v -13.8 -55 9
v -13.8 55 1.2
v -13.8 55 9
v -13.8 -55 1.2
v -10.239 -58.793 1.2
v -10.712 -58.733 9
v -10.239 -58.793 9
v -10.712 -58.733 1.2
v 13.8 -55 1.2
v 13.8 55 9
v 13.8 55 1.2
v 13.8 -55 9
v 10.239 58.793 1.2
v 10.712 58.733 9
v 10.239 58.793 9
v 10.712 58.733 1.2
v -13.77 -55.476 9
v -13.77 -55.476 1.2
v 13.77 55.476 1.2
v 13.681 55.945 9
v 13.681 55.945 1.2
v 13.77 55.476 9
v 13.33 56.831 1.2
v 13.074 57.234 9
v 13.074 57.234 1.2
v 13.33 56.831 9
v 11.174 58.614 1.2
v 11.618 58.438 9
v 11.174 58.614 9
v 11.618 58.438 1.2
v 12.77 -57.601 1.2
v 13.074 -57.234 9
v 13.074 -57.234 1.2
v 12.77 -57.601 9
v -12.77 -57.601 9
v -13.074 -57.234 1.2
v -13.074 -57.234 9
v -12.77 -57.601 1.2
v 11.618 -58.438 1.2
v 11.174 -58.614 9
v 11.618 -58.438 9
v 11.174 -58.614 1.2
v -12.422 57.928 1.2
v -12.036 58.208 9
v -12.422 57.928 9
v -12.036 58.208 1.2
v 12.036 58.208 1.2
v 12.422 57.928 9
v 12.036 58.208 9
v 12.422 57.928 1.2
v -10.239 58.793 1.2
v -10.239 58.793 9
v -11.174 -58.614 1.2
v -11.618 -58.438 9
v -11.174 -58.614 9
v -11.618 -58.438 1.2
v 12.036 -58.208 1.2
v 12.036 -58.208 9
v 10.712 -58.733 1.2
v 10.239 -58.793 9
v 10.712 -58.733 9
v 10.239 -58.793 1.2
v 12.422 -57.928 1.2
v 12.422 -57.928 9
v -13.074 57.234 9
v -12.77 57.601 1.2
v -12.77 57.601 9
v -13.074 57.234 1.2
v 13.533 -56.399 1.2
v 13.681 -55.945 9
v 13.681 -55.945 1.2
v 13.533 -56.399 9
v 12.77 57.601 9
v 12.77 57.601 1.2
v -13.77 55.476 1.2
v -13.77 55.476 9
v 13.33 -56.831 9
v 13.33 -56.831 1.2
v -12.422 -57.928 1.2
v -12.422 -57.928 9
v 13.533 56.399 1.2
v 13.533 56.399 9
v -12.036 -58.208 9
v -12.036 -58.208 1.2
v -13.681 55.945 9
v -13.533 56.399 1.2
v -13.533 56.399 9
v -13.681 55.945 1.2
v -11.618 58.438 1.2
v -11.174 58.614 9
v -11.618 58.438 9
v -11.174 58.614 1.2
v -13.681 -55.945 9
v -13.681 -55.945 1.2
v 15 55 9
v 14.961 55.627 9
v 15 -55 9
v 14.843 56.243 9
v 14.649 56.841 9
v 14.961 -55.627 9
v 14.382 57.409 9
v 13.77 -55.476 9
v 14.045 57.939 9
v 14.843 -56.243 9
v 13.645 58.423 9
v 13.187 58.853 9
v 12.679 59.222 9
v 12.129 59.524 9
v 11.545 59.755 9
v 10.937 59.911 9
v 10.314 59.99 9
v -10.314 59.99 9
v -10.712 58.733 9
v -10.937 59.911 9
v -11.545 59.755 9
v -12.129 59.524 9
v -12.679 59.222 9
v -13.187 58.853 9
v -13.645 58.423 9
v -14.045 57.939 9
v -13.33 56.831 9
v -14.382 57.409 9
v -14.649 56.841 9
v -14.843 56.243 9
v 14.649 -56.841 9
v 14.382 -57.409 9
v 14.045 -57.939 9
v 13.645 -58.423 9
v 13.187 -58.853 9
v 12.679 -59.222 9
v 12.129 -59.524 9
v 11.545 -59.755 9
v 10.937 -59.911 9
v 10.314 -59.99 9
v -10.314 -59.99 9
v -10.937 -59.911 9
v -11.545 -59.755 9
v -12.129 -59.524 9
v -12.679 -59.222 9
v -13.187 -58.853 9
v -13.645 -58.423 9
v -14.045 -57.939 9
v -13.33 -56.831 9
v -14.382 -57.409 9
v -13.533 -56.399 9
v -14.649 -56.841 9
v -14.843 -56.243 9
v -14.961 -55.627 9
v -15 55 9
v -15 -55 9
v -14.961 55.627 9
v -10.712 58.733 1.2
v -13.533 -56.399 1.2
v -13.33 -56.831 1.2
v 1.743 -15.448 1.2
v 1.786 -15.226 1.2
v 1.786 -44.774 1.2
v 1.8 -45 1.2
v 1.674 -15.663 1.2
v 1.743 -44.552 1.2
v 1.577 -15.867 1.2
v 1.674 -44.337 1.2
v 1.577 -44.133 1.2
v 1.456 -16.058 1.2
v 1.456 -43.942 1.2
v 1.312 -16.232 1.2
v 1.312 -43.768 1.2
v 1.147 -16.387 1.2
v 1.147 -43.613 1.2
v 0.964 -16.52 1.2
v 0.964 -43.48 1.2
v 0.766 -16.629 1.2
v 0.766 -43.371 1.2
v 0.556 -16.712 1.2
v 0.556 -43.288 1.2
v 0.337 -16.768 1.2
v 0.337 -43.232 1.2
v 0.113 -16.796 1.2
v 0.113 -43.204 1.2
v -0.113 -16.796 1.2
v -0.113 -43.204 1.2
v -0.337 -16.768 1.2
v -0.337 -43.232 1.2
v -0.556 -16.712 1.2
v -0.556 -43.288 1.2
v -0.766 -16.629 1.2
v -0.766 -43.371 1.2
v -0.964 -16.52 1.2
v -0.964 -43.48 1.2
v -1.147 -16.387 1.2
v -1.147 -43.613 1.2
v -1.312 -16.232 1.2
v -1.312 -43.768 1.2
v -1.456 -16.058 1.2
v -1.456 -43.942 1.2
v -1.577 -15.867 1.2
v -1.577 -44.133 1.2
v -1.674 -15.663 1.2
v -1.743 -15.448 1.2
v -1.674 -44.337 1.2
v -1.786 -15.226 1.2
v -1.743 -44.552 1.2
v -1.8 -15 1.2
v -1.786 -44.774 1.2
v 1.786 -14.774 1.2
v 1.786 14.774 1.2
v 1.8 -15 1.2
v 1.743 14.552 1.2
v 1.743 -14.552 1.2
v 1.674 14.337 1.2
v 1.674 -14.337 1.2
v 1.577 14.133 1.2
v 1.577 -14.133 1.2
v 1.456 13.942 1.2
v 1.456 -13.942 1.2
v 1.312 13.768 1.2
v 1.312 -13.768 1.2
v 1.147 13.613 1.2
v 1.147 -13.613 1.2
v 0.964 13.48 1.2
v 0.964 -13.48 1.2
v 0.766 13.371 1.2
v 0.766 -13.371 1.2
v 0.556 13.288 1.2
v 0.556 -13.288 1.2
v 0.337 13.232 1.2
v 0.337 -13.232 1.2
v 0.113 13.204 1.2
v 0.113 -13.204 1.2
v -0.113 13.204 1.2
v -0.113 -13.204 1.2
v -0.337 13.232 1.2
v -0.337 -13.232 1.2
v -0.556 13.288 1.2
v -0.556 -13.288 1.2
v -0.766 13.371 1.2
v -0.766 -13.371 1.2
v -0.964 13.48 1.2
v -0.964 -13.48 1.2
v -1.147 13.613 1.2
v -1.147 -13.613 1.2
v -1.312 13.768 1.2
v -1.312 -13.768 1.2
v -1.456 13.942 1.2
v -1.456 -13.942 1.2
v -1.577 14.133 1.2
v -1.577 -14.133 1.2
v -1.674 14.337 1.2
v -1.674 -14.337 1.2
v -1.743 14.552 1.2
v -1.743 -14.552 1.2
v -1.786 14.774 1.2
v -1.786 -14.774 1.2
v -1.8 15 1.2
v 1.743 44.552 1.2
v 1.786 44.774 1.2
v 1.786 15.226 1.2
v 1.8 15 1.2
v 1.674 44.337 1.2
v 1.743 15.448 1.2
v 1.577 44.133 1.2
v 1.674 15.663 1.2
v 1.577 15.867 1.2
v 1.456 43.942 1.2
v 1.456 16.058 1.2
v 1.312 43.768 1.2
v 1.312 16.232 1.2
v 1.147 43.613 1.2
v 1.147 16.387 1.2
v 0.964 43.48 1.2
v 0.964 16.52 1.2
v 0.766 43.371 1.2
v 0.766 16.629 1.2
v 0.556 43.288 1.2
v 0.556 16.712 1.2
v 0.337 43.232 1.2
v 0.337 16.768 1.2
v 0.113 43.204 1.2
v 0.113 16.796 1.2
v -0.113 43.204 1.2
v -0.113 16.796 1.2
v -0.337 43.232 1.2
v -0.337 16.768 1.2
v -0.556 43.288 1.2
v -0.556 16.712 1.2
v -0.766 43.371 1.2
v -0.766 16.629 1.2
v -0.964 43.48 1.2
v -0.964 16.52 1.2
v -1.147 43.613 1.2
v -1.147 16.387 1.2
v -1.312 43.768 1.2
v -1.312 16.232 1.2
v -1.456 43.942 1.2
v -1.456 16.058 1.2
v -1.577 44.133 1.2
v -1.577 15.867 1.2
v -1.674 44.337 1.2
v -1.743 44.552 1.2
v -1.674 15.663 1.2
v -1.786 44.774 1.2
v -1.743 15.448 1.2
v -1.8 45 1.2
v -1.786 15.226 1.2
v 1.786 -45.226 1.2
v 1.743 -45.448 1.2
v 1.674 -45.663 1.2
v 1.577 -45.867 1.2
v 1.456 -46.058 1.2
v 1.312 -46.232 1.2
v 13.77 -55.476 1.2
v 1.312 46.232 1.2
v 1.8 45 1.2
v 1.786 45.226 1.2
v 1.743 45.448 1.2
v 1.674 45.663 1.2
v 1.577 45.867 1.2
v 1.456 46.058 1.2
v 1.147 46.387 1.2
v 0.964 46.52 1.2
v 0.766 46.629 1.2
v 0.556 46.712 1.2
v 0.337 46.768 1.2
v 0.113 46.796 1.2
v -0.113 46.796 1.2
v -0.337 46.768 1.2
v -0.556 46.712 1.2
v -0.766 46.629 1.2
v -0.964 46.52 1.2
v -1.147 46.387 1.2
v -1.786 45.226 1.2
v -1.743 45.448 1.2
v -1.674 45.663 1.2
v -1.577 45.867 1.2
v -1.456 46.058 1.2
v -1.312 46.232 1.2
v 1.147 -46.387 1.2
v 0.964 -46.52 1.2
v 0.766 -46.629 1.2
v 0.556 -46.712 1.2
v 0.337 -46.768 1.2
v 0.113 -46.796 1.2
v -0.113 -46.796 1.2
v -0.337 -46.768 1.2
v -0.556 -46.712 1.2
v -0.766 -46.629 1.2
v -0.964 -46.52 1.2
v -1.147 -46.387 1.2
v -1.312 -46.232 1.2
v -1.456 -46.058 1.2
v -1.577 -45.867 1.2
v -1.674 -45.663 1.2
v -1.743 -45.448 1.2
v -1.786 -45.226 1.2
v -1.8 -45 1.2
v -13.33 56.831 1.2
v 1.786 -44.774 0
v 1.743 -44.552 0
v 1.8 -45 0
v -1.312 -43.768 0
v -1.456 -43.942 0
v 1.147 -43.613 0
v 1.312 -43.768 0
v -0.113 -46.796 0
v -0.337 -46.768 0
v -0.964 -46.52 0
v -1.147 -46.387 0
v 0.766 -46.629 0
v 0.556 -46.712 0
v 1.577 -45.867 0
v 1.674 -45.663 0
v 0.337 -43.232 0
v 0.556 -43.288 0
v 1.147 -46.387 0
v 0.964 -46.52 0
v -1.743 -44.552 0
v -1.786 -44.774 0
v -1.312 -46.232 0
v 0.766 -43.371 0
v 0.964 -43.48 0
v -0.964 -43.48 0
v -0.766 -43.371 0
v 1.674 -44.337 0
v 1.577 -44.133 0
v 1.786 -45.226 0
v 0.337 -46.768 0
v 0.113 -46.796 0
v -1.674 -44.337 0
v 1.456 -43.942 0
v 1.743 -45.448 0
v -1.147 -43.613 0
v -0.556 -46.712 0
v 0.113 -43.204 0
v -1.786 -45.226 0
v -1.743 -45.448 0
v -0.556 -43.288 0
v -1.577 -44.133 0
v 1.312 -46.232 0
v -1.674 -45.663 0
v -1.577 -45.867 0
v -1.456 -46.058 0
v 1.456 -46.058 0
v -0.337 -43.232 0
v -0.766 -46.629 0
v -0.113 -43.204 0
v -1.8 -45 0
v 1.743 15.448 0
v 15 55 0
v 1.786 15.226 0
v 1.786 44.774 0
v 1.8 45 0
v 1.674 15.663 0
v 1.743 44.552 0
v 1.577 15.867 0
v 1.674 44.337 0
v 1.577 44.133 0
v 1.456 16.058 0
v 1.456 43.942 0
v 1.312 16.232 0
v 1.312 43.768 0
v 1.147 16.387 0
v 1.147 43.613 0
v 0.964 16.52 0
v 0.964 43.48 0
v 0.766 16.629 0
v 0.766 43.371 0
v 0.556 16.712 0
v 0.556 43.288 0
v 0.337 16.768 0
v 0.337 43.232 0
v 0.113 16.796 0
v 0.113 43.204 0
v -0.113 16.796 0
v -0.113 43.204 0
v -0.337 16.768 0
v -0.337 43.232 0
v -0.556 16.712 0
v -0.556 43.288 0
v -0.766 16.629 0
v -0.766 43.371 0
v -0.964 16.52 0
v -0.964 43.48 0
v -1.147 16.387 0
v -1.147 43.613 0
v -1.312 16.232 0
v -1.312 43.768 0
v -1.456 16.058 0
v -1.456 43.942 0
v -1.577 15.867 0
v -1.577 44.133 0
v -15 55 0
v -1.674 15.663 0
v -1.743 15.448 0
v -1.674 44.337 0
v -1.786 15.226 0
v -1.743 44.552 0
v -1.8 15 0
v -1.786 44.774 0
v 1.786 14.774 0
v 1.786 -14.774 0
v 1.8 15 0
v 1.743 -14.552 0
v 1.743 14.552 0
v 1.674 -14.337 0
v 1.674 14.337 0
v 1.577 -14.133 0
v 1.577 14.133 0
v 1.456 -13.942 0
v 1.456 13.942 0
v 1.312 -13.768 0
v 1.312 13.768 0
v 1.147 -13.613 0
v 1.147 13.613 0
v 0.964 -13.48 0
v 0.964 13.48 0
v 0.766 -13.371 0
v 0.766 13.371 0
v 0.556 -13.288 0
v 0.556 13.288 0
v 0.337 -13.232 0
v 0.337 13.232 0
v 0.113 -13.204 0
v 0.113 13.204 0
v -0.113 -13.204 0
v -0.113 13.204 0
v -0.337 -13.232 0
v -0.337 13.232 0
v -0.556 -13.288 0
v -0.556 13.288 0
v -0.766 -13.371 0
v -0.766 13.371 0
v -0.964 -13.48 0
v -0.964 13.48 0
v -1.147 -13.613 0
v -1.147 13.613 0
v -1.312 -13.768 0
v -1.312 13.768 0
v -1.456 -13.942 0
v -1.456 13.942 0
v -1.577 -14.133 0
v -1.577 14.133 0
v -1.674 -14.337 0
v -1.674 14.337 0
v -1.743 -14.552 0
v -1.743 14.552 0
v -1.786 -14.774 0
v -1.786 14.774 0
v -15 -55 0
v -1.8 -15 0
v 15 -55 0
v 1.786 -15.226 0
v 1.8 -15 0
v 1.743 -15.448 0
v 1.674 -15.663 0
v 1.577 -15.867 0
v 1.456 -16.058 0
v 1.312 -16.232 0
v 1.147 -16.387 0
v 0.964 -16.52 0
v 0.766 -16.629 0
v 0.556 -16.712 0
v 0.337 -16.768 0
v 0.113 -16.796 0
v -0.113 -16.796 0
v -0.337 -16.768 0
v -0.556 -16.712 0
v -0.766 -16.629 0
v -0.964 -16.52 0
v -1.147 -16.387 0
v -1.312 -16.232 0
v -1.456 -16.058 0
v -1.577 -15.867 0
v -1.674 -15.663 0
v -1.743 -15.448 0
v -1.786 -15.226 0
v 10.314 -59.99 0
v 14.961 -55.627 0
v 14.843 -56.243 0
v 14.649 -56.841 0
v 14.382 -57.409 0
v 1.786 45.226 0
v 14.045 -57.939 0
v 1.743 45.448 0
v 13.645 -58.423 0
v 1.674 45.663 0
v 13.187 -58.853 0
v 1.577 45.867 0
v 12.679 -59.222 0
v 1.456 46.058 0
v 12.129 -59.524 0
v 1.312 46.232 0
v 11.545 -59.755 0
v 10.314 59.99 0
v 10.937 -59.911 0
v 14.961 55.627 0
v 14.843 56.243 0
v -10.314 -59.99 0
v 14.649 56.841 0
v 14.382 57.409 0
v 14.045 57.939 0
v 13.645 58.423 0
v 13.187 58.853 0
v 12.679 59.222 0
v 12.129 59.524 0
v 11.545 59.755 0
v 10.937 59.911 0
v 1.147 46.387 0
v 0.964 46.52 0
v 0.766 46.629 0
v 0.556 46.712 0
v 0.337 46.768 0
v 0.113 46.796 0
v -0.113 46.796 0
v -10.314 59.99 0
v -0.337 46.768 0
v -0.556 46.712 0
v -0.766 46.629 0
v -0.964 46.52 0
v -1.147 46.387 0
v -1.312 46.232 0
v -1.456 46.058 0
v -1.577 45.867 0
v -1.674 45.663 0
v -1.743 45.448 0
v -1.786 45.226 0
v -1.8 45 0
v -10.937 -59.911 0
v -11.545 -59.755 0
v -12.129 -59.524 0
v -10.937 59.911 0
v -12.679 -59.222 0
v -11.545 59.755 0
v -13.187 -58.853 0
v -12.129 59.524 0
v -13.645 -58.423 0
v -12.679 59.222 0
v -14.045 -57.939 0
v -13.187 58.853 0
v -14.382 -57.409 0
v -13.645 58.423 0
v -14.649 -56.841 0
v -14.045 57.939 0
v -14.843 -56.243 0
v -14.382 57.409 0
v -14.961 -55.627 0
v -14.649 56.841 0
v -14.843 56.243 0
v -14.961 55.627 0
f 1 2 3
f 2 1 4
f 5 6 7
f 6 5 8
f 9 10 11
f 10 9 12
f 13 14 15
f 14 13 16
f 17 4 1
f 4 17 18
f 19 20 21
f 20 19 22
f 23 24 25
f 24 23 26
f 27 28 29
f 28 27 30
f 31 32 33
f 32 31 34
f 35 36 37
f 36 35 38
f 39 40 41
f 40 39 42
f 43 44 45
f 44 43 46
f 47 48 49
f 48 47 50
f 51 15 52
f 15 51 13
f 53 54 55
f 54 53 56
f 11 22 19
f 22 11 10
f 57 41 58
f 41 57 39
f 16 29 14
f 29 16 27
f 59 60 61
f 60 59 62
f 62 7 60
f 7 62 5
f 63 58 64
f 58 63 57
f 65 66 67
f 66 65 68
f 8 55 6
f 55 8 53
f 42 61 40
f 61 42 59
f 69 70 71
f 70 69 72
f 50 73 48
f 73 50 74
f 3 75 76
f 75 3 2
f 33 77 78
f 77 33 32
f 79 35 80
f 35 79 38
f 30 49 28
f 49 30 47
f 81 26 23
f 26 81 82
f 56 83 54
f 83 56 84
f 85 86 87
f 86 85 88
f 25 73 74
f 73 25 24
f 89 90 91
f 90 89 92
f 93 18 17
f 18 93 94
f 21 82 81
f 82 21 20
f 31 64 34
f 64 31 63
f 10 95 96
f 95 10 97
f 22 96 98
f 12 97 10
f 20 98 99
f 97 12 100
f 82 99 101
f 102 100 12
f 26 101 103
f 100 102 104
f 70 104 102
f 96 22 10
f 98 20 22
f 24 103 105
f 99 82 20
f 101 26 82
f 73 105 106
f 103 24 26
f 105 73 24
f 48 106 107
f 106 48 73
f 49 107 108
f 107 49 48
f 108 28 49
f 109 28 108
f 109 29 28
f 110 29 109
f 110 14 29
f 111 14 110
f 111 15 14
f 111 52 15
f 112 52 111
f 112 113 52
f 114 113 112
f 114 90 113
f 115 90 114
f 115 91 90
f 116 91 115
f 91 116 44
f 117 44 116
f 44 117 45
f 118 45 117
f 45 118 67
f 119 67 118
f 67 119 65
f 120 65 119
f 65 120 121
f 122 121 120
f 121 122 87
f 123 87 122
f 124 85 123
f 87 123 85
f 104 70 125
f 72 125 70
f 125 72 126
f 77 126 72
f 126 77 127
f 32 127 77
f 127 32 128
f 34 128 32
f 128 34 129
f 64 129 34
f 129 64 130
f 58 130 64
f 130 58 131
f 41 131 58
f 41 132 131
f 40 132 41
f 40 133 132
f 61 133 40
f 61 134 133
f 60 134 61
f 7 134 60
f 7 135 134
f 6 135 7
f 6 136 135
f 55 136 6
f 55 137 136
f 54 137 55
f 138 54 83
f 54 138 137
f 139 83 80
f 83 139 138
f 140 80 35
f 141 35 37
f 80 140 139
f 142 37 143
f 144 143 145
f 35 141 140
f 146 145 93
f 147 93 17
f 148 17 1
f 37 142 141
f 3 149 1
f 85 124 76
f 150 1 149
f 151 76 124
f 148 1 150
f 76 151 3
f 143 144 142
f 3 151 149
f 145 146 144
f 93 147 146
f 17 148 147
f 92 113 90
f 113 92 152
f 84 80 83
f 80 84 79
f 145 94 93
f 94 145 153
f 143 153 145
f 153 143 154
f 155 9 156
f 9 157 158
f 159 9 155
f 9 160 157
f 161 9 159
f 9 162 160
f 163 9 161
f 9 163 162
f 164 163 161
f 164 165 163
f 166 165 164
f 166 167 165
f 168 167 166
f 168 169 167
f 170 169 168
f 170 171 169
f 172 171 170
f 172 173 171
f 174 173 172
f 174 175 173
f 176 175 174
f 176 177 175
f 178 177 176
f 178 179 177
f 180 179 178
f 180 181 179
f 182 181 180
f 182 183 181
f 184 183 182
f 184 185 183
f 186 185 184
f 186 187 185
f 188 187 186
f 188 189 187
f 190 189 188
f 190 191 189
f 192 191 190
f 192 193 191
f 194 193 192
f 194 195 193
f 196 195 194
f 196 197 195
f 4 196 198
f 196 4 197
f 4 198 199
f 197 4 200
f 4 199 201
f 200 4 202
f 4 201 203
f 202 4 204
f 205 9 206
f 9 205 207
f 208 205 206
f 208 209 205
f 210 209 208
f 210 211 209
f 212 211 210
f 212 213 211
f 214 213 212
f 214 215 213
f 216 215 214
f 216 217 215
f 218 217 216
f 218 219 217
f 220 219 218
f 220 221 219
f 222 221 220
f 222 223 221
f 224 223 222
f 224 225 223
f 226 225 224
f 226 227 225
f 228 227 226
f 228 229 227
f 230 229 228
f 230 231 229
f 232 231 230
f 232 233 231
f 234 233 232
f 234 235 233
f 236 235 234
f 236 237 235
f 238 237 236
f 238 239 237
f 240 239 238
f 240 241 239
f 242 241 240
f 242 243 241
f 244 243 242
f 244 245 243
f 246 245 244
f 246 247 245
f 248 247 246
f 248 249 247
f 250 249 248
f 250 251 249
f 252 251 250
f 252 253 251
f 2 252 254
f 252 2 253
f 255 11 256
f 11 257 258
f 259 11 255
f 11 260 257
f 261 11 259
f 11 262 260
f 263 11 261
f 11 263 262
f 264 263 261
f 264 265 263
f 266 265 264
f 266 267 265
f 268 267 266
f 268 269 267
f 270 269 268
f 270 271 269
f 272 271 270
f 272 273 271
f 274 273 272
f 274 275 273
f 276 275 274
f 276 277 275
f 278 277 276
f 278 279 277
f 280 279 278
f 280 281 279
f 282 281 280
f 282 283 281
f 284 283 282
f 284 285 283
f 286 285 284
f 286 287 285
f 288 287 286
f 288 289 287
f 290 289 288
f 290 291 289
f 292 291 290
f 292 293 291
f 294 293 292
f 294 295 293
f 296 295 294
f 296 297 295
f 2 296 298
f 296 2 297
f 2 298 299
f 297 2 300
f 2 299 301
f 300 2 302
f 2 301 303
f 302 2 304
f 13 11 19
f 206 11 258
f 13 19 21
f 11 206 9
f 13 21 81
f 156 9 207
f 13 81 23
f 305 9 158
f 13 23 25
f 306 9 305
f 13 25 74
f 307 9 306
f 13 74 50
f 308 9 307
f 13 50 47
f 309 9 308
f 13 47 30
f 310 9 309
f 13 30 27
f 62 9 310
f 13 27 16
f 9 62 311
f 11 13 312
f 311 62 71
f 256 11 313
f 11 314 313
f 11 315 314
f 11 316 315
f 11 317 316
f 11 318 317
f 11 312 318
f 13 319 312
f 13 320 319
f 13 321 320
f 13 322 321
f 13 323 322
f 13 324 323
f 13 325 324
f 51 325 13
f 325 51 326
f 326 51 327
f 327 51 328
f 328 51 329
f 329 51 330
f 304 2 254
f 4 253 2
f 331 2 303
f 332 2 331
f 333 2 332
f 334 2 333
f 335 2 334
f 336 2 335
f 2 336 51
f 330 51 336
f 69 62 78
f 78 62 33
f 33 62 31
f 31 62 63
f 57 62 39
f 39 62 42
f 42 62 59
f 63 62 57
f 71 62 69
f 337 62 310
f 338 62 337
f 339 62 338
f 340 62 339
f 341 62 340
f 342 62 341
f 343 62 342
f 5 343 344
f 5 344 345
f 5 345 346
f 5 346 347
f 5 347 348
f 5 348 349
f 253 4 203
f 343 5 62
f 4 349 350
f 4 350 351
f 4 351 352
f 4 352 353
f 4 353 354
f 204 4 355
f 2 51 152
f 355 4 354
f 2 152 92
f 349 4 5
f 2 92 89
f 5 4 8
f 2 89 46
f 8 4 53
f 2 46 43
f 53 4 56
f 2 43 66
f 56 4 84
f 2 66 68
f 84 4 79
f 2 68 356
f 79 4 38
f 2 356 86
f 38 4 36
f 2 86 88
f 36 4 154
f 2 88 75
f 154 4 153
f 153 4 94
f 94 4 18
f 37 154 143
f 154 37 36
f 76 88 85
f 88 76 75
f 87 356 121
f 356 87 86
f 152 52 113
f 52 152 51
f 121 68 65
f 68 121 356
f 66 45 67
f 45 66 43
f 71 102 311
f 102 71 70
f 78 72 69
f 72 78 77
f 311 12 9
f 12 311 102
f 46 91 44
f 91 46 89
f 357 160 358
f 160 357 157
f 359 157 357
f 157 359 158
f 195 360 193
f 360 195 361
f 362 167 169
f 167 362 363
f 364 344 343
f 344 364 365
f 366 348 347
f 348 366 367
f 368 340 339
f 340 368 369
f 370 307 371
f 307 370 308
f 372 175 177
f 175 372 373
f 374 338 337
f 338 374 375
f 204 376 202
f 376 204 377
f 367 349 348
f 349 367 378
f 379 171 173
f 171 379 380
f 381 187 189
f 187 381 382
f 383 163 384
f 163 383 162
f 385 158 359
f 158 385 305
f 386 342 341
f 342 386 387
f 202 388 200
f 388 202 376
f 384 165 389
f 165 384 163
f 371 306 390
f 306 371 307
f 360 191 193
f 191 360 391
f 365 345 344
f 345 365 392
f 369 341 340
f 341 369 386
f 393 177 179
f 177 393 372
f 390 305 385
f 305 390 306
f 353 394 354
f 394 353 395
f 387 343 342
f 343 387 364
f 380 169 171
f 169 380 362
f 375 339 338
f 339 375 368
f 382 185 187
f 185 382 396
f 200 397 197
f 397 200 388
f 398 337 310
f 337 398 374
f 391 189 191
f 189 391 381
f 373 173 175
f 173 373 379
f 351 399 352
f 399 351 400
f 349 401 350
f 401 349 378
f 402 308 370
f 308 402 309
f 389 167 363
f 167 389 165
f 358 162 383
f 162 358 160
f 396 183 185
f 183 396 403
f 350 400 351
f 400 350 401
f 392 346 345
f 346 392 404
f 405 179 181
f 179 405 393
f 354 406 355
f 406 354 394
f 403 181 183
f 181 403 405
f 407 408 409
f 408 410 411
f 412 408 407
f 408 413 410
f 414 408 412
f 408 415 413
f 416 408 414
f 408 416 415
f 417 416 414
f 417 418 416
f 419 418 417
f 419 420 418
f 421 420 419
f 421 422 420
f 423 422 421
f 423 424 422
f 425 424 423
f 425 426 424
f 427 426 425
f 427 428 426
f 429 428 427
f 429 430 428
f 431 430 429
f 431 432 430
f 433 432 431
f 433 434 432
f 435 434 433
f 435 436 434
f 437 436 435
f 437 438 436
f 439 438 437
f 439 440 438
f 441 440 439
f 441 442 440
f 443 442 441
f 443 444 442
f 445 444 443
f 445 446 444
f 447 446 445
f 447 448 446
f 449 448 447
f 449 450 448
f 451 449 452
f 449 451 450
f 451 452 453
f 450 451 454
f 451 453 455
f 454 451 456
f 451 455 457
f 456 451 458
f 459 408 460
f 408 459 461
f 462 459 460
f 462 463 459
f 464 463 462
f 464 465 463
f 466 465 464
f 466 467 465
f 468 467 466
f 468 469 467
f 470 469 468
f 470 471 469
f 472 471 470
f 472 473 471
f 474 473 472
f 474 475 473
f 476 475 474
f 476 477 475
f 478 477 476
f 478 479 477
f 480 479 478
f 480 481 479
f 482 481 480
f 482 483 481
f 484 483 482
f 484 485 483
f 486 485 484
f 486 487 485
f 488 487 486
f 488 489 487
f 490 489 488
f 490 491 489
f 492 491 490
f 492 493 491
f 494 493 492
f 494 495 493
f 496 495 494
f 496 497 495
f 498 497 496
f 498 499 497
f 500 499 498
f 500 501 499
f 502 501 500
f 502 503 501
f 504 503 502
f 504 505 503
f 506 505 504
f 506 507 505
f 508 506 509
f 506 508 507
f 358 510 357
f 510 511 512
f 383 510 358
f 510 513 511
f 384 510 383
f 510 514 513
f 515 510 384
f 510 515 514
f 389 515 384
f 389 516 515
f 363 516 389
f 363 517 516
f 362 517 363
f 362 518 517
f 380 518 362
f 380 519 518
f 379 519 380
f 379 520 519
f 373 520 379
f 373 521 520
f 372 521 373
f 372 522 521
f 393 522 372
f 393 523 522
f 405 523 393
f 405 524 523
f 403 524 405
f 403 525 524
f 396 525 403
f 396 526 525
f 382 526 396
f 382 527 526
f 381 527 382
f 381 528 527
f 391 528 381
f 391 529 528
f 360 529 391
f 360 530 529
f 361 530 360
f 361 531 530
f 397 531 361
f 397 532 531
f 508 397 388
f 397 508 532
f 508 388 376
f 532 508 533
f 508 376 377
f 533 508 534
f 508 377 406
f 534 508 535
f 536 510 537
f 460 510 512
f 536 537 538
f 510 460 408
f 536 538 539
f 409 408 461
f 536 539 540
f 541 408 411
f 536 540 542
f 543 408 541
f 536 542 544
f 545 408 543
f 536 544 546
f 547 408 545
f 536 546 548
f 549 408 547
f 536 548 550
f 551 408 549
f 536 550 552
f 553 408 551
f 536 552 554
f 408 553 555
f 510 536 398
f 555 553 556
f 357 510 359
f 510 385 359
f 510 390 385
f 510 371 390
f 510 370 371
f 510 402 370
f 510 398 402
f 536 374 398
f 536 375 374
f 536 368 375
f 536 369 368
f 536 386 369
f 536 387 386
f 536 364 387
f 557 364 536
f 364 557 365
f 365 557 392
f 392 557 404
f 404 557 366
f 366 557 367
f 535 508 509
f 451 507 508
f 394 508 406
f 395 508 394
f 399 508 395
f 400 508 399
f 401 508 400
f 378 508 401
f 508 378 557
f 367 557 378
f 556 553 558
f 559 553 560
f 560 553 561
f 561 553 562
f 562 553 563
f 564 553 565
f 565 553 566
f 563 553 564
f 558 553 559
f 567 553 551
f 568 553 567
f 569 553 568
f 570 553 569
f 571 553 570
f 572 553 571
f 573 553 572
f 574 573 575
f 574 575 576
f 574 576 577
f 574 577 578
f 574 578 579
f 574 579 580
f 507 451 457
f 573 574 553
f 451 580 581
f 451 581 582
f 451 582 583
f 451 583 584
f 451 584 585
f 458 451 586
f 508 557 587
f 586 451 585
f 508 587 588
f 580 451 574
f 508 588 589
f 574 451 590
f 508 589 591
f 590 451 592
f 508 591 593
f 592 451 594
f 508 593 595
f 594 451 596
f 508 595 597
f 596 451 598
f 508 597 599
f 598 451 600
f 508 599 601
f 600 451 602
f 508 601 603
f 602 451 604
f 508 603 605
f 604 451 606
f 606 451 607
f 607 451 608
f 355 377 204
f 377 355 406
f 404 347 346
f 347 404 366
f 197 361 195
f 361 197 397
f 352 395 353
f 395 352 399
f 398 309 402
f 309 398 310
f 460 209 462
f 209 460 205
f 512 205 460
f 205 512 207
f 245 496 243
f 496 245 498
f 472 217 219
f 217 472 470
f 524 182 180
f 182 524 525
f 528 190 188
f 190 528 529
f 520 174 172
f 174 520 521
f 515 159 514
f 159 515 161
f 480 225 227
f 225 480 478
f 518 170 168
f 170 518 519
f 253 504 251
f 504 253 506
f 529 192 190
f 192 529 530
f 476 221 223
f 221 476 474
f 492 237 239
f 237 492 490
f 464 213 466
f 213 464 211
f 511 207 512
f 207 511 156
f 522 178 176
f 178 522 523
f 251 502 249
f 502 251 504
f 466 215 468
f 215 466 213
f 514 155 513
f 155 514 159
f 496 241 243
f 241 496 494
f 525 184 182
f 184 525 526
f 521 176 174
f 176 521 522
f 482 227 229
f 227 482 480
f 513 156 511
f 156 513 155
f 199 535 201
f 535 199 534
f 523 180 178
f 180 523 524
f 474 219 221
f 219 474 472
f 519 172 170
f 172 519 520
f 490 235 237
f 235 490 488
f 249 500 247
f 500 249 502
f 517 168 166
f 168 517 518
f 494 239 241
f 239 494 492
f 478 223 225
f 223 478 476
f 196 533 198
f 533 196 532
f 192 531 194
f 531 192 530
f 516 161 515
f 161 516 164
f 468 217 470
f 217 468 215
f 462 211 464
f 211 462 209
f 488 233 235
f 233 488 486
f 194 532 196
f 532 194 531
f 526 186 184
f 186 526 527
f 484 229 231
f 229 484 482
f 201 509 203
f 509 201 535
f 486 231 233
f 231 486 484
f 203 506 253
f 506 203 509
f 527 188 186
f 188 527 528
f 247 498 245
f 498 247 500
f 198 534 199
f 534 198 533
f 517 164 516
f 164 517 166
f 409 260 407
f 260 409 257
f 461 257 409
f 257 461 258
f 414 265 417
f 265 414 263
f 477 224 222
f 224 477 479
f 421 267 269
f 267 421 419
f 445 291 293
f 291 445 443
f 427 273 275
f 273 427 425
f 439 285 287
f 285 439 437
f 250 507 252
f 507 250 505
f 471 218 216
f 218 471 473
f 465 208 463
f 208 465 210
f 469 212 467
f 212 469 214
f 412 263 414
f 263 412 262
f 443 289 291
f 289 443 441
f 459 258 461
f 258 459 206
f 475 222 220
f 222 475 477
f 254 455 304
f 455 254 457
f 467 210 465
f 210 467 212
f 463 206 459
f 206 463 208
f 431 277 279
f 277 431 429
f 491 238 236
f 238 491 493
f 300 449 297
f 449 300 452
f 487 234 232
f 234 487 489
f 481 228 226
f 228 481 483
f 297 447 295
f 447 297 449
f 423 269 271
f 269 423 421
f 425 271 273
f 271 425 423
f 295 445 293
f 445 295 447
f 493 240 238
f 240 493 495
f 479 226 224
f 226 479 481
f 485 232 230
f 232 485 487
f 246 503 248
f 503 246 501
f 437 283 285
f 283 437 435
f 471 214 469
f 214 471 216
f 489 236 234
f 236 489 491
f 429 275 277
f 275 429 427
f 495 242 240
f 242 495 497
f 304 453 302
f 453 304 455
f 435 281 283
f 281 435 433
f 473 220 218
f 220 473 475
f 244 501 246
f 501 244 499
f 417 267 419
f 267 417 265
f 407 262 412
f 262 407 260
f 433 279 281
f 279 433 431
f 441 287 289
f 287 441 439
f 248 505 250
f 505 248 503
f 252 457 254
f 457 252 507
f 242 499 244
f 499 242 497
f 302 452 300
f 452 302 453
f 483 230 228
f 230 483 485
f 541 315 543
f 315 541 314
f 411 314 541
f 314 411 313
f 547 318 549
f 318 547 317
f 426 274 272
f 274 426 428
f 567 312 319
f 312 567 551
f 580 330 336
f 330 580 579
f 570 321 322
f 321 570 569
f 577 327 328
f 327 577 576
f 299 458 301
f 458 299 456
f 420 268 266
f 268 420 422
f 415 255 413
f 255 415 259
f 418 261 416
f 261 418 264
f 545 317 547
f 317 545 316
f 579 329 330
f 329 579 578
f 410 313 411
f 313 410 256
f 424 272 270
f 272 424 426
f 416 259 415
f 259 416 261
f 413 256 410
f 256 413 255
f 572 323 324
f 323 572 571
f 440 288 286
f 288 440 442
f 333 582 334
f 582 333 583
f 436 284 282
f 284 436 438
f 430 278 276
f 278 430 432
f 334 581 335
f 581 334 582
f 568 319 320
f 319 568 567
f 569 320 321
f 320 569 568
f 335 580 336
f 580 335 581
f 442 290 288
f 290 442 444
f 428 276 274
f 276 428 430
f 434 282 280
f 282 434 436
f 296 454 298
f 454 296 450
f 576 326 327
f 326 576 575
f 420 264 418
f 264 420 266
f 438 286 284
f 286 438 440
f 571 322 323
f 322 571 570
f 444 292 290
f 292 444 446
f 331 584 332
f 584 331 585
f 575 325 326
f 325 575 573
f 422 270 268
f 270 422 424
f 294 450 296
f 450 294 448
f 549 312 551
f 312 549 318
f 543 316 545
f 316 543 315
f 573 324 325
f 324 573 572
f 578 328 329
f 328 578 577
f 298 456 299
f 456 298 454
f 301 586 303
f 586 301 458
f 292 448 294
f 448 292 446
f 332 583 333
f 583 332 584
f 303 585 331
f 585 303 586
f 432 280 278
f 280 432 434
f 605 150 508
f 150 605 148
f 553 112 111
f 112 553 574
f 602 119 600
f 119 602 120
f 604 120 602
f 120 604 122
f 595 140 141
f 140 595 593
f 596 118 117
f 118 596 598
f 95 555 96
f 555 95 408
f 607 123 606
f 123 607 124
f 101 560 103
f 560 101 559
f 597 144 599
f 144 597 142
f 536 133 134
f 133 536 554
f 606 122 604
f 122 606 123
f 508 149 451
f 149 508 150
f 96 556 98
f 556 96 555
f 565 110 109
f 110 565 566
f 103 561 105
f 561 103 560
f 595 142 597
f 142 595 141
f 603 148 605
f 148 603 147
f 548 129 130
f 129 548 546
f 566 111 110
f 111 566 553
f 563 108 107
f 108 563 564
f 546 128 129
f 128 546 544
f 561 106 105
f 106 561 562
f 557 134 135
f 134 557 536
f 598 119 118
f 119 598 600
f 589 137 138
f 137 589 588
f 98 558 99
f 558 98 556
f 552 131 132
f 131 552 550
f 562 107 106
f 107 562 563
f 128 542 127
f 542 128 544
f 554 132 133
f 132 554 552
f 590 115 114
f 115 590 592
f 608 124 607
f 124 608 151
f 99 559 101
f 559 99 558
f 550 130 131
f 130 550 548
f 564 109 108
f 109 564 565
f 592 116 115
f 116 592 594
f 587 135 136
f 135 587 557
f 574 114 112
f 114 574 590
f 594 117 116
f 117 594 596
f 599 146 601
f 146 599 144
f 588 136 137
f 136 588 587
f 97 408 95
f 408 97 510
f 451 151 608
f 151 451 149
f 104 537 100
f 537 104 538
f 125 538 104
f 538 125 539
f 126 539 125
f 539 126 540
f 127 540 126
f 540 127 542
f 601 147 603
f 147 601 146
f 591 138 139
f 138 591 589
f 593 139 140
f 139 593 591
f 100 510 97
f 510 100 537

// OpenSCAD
$fn = 50;


difference() {
	union() {
		hull() {
			translate(v = [-10.0000000000, 55.0000000000, 0]) {
				cylinder(h = 9, r = 5);
			}
			translate(v = [10.0000000000, 55.0000000000, 0]) {
				cylinder(h = 9, r = 5);
			}
			translate(v = [-10.0000000000, -55.0000000000, 0]) {
				cylinder(h = 9, r = 5);
			}
			translate(v = [10.0000000000, -55.0000000000, 0]) {
				cylinder(h = 9, r = 5);
			}
		}
	}
	union() {
		translate(v = [0, 0, 1.2000000000]) {
			hull() {
				translate(v = [-10.0000000000, 55.0000000000, 0]) {
					cylinder(h = 7.8000000000, r = 3.8000000000);
				}
				translate(v = [10.0000000000, 55.0000000000, 0]) {
					cylinder(h = 7.8000000000, r = 3.8000000000);
				}
				translate(v = [-10.0000000000, -55.0000000000, 0]) {
					cylinder(h = 7.8000000000, r = 3.8000000000);
				}
				translate(v = [10.0000000000, -55.0000000000, 0]) {
					cylinder(h = 7.8000000000, r = 3.8000000000);
				}
			}
		}
		#translate(v = [0.0000000000, -45.0000000000, 0]) {
			cylinder(h = 1.2000000000, r = 1.8000000000);
		}
		#translate(v = [0.0000000000, -15.0000000000, 0]) {
			cylinder(h = 1.2000000000, r = 1.8000000000);
		}
		#translate(v = [0.0000000000, 15.0000000000, 0]) {
			cylinder(h = 1.2000000000, r = 1.8000000000);
		}
		#translate(v = [0.0000000000, 45.0000000000, 0]) {
			cylinder(h = 1.2000000000, r = 1.8000000000);
		}
	}
}
